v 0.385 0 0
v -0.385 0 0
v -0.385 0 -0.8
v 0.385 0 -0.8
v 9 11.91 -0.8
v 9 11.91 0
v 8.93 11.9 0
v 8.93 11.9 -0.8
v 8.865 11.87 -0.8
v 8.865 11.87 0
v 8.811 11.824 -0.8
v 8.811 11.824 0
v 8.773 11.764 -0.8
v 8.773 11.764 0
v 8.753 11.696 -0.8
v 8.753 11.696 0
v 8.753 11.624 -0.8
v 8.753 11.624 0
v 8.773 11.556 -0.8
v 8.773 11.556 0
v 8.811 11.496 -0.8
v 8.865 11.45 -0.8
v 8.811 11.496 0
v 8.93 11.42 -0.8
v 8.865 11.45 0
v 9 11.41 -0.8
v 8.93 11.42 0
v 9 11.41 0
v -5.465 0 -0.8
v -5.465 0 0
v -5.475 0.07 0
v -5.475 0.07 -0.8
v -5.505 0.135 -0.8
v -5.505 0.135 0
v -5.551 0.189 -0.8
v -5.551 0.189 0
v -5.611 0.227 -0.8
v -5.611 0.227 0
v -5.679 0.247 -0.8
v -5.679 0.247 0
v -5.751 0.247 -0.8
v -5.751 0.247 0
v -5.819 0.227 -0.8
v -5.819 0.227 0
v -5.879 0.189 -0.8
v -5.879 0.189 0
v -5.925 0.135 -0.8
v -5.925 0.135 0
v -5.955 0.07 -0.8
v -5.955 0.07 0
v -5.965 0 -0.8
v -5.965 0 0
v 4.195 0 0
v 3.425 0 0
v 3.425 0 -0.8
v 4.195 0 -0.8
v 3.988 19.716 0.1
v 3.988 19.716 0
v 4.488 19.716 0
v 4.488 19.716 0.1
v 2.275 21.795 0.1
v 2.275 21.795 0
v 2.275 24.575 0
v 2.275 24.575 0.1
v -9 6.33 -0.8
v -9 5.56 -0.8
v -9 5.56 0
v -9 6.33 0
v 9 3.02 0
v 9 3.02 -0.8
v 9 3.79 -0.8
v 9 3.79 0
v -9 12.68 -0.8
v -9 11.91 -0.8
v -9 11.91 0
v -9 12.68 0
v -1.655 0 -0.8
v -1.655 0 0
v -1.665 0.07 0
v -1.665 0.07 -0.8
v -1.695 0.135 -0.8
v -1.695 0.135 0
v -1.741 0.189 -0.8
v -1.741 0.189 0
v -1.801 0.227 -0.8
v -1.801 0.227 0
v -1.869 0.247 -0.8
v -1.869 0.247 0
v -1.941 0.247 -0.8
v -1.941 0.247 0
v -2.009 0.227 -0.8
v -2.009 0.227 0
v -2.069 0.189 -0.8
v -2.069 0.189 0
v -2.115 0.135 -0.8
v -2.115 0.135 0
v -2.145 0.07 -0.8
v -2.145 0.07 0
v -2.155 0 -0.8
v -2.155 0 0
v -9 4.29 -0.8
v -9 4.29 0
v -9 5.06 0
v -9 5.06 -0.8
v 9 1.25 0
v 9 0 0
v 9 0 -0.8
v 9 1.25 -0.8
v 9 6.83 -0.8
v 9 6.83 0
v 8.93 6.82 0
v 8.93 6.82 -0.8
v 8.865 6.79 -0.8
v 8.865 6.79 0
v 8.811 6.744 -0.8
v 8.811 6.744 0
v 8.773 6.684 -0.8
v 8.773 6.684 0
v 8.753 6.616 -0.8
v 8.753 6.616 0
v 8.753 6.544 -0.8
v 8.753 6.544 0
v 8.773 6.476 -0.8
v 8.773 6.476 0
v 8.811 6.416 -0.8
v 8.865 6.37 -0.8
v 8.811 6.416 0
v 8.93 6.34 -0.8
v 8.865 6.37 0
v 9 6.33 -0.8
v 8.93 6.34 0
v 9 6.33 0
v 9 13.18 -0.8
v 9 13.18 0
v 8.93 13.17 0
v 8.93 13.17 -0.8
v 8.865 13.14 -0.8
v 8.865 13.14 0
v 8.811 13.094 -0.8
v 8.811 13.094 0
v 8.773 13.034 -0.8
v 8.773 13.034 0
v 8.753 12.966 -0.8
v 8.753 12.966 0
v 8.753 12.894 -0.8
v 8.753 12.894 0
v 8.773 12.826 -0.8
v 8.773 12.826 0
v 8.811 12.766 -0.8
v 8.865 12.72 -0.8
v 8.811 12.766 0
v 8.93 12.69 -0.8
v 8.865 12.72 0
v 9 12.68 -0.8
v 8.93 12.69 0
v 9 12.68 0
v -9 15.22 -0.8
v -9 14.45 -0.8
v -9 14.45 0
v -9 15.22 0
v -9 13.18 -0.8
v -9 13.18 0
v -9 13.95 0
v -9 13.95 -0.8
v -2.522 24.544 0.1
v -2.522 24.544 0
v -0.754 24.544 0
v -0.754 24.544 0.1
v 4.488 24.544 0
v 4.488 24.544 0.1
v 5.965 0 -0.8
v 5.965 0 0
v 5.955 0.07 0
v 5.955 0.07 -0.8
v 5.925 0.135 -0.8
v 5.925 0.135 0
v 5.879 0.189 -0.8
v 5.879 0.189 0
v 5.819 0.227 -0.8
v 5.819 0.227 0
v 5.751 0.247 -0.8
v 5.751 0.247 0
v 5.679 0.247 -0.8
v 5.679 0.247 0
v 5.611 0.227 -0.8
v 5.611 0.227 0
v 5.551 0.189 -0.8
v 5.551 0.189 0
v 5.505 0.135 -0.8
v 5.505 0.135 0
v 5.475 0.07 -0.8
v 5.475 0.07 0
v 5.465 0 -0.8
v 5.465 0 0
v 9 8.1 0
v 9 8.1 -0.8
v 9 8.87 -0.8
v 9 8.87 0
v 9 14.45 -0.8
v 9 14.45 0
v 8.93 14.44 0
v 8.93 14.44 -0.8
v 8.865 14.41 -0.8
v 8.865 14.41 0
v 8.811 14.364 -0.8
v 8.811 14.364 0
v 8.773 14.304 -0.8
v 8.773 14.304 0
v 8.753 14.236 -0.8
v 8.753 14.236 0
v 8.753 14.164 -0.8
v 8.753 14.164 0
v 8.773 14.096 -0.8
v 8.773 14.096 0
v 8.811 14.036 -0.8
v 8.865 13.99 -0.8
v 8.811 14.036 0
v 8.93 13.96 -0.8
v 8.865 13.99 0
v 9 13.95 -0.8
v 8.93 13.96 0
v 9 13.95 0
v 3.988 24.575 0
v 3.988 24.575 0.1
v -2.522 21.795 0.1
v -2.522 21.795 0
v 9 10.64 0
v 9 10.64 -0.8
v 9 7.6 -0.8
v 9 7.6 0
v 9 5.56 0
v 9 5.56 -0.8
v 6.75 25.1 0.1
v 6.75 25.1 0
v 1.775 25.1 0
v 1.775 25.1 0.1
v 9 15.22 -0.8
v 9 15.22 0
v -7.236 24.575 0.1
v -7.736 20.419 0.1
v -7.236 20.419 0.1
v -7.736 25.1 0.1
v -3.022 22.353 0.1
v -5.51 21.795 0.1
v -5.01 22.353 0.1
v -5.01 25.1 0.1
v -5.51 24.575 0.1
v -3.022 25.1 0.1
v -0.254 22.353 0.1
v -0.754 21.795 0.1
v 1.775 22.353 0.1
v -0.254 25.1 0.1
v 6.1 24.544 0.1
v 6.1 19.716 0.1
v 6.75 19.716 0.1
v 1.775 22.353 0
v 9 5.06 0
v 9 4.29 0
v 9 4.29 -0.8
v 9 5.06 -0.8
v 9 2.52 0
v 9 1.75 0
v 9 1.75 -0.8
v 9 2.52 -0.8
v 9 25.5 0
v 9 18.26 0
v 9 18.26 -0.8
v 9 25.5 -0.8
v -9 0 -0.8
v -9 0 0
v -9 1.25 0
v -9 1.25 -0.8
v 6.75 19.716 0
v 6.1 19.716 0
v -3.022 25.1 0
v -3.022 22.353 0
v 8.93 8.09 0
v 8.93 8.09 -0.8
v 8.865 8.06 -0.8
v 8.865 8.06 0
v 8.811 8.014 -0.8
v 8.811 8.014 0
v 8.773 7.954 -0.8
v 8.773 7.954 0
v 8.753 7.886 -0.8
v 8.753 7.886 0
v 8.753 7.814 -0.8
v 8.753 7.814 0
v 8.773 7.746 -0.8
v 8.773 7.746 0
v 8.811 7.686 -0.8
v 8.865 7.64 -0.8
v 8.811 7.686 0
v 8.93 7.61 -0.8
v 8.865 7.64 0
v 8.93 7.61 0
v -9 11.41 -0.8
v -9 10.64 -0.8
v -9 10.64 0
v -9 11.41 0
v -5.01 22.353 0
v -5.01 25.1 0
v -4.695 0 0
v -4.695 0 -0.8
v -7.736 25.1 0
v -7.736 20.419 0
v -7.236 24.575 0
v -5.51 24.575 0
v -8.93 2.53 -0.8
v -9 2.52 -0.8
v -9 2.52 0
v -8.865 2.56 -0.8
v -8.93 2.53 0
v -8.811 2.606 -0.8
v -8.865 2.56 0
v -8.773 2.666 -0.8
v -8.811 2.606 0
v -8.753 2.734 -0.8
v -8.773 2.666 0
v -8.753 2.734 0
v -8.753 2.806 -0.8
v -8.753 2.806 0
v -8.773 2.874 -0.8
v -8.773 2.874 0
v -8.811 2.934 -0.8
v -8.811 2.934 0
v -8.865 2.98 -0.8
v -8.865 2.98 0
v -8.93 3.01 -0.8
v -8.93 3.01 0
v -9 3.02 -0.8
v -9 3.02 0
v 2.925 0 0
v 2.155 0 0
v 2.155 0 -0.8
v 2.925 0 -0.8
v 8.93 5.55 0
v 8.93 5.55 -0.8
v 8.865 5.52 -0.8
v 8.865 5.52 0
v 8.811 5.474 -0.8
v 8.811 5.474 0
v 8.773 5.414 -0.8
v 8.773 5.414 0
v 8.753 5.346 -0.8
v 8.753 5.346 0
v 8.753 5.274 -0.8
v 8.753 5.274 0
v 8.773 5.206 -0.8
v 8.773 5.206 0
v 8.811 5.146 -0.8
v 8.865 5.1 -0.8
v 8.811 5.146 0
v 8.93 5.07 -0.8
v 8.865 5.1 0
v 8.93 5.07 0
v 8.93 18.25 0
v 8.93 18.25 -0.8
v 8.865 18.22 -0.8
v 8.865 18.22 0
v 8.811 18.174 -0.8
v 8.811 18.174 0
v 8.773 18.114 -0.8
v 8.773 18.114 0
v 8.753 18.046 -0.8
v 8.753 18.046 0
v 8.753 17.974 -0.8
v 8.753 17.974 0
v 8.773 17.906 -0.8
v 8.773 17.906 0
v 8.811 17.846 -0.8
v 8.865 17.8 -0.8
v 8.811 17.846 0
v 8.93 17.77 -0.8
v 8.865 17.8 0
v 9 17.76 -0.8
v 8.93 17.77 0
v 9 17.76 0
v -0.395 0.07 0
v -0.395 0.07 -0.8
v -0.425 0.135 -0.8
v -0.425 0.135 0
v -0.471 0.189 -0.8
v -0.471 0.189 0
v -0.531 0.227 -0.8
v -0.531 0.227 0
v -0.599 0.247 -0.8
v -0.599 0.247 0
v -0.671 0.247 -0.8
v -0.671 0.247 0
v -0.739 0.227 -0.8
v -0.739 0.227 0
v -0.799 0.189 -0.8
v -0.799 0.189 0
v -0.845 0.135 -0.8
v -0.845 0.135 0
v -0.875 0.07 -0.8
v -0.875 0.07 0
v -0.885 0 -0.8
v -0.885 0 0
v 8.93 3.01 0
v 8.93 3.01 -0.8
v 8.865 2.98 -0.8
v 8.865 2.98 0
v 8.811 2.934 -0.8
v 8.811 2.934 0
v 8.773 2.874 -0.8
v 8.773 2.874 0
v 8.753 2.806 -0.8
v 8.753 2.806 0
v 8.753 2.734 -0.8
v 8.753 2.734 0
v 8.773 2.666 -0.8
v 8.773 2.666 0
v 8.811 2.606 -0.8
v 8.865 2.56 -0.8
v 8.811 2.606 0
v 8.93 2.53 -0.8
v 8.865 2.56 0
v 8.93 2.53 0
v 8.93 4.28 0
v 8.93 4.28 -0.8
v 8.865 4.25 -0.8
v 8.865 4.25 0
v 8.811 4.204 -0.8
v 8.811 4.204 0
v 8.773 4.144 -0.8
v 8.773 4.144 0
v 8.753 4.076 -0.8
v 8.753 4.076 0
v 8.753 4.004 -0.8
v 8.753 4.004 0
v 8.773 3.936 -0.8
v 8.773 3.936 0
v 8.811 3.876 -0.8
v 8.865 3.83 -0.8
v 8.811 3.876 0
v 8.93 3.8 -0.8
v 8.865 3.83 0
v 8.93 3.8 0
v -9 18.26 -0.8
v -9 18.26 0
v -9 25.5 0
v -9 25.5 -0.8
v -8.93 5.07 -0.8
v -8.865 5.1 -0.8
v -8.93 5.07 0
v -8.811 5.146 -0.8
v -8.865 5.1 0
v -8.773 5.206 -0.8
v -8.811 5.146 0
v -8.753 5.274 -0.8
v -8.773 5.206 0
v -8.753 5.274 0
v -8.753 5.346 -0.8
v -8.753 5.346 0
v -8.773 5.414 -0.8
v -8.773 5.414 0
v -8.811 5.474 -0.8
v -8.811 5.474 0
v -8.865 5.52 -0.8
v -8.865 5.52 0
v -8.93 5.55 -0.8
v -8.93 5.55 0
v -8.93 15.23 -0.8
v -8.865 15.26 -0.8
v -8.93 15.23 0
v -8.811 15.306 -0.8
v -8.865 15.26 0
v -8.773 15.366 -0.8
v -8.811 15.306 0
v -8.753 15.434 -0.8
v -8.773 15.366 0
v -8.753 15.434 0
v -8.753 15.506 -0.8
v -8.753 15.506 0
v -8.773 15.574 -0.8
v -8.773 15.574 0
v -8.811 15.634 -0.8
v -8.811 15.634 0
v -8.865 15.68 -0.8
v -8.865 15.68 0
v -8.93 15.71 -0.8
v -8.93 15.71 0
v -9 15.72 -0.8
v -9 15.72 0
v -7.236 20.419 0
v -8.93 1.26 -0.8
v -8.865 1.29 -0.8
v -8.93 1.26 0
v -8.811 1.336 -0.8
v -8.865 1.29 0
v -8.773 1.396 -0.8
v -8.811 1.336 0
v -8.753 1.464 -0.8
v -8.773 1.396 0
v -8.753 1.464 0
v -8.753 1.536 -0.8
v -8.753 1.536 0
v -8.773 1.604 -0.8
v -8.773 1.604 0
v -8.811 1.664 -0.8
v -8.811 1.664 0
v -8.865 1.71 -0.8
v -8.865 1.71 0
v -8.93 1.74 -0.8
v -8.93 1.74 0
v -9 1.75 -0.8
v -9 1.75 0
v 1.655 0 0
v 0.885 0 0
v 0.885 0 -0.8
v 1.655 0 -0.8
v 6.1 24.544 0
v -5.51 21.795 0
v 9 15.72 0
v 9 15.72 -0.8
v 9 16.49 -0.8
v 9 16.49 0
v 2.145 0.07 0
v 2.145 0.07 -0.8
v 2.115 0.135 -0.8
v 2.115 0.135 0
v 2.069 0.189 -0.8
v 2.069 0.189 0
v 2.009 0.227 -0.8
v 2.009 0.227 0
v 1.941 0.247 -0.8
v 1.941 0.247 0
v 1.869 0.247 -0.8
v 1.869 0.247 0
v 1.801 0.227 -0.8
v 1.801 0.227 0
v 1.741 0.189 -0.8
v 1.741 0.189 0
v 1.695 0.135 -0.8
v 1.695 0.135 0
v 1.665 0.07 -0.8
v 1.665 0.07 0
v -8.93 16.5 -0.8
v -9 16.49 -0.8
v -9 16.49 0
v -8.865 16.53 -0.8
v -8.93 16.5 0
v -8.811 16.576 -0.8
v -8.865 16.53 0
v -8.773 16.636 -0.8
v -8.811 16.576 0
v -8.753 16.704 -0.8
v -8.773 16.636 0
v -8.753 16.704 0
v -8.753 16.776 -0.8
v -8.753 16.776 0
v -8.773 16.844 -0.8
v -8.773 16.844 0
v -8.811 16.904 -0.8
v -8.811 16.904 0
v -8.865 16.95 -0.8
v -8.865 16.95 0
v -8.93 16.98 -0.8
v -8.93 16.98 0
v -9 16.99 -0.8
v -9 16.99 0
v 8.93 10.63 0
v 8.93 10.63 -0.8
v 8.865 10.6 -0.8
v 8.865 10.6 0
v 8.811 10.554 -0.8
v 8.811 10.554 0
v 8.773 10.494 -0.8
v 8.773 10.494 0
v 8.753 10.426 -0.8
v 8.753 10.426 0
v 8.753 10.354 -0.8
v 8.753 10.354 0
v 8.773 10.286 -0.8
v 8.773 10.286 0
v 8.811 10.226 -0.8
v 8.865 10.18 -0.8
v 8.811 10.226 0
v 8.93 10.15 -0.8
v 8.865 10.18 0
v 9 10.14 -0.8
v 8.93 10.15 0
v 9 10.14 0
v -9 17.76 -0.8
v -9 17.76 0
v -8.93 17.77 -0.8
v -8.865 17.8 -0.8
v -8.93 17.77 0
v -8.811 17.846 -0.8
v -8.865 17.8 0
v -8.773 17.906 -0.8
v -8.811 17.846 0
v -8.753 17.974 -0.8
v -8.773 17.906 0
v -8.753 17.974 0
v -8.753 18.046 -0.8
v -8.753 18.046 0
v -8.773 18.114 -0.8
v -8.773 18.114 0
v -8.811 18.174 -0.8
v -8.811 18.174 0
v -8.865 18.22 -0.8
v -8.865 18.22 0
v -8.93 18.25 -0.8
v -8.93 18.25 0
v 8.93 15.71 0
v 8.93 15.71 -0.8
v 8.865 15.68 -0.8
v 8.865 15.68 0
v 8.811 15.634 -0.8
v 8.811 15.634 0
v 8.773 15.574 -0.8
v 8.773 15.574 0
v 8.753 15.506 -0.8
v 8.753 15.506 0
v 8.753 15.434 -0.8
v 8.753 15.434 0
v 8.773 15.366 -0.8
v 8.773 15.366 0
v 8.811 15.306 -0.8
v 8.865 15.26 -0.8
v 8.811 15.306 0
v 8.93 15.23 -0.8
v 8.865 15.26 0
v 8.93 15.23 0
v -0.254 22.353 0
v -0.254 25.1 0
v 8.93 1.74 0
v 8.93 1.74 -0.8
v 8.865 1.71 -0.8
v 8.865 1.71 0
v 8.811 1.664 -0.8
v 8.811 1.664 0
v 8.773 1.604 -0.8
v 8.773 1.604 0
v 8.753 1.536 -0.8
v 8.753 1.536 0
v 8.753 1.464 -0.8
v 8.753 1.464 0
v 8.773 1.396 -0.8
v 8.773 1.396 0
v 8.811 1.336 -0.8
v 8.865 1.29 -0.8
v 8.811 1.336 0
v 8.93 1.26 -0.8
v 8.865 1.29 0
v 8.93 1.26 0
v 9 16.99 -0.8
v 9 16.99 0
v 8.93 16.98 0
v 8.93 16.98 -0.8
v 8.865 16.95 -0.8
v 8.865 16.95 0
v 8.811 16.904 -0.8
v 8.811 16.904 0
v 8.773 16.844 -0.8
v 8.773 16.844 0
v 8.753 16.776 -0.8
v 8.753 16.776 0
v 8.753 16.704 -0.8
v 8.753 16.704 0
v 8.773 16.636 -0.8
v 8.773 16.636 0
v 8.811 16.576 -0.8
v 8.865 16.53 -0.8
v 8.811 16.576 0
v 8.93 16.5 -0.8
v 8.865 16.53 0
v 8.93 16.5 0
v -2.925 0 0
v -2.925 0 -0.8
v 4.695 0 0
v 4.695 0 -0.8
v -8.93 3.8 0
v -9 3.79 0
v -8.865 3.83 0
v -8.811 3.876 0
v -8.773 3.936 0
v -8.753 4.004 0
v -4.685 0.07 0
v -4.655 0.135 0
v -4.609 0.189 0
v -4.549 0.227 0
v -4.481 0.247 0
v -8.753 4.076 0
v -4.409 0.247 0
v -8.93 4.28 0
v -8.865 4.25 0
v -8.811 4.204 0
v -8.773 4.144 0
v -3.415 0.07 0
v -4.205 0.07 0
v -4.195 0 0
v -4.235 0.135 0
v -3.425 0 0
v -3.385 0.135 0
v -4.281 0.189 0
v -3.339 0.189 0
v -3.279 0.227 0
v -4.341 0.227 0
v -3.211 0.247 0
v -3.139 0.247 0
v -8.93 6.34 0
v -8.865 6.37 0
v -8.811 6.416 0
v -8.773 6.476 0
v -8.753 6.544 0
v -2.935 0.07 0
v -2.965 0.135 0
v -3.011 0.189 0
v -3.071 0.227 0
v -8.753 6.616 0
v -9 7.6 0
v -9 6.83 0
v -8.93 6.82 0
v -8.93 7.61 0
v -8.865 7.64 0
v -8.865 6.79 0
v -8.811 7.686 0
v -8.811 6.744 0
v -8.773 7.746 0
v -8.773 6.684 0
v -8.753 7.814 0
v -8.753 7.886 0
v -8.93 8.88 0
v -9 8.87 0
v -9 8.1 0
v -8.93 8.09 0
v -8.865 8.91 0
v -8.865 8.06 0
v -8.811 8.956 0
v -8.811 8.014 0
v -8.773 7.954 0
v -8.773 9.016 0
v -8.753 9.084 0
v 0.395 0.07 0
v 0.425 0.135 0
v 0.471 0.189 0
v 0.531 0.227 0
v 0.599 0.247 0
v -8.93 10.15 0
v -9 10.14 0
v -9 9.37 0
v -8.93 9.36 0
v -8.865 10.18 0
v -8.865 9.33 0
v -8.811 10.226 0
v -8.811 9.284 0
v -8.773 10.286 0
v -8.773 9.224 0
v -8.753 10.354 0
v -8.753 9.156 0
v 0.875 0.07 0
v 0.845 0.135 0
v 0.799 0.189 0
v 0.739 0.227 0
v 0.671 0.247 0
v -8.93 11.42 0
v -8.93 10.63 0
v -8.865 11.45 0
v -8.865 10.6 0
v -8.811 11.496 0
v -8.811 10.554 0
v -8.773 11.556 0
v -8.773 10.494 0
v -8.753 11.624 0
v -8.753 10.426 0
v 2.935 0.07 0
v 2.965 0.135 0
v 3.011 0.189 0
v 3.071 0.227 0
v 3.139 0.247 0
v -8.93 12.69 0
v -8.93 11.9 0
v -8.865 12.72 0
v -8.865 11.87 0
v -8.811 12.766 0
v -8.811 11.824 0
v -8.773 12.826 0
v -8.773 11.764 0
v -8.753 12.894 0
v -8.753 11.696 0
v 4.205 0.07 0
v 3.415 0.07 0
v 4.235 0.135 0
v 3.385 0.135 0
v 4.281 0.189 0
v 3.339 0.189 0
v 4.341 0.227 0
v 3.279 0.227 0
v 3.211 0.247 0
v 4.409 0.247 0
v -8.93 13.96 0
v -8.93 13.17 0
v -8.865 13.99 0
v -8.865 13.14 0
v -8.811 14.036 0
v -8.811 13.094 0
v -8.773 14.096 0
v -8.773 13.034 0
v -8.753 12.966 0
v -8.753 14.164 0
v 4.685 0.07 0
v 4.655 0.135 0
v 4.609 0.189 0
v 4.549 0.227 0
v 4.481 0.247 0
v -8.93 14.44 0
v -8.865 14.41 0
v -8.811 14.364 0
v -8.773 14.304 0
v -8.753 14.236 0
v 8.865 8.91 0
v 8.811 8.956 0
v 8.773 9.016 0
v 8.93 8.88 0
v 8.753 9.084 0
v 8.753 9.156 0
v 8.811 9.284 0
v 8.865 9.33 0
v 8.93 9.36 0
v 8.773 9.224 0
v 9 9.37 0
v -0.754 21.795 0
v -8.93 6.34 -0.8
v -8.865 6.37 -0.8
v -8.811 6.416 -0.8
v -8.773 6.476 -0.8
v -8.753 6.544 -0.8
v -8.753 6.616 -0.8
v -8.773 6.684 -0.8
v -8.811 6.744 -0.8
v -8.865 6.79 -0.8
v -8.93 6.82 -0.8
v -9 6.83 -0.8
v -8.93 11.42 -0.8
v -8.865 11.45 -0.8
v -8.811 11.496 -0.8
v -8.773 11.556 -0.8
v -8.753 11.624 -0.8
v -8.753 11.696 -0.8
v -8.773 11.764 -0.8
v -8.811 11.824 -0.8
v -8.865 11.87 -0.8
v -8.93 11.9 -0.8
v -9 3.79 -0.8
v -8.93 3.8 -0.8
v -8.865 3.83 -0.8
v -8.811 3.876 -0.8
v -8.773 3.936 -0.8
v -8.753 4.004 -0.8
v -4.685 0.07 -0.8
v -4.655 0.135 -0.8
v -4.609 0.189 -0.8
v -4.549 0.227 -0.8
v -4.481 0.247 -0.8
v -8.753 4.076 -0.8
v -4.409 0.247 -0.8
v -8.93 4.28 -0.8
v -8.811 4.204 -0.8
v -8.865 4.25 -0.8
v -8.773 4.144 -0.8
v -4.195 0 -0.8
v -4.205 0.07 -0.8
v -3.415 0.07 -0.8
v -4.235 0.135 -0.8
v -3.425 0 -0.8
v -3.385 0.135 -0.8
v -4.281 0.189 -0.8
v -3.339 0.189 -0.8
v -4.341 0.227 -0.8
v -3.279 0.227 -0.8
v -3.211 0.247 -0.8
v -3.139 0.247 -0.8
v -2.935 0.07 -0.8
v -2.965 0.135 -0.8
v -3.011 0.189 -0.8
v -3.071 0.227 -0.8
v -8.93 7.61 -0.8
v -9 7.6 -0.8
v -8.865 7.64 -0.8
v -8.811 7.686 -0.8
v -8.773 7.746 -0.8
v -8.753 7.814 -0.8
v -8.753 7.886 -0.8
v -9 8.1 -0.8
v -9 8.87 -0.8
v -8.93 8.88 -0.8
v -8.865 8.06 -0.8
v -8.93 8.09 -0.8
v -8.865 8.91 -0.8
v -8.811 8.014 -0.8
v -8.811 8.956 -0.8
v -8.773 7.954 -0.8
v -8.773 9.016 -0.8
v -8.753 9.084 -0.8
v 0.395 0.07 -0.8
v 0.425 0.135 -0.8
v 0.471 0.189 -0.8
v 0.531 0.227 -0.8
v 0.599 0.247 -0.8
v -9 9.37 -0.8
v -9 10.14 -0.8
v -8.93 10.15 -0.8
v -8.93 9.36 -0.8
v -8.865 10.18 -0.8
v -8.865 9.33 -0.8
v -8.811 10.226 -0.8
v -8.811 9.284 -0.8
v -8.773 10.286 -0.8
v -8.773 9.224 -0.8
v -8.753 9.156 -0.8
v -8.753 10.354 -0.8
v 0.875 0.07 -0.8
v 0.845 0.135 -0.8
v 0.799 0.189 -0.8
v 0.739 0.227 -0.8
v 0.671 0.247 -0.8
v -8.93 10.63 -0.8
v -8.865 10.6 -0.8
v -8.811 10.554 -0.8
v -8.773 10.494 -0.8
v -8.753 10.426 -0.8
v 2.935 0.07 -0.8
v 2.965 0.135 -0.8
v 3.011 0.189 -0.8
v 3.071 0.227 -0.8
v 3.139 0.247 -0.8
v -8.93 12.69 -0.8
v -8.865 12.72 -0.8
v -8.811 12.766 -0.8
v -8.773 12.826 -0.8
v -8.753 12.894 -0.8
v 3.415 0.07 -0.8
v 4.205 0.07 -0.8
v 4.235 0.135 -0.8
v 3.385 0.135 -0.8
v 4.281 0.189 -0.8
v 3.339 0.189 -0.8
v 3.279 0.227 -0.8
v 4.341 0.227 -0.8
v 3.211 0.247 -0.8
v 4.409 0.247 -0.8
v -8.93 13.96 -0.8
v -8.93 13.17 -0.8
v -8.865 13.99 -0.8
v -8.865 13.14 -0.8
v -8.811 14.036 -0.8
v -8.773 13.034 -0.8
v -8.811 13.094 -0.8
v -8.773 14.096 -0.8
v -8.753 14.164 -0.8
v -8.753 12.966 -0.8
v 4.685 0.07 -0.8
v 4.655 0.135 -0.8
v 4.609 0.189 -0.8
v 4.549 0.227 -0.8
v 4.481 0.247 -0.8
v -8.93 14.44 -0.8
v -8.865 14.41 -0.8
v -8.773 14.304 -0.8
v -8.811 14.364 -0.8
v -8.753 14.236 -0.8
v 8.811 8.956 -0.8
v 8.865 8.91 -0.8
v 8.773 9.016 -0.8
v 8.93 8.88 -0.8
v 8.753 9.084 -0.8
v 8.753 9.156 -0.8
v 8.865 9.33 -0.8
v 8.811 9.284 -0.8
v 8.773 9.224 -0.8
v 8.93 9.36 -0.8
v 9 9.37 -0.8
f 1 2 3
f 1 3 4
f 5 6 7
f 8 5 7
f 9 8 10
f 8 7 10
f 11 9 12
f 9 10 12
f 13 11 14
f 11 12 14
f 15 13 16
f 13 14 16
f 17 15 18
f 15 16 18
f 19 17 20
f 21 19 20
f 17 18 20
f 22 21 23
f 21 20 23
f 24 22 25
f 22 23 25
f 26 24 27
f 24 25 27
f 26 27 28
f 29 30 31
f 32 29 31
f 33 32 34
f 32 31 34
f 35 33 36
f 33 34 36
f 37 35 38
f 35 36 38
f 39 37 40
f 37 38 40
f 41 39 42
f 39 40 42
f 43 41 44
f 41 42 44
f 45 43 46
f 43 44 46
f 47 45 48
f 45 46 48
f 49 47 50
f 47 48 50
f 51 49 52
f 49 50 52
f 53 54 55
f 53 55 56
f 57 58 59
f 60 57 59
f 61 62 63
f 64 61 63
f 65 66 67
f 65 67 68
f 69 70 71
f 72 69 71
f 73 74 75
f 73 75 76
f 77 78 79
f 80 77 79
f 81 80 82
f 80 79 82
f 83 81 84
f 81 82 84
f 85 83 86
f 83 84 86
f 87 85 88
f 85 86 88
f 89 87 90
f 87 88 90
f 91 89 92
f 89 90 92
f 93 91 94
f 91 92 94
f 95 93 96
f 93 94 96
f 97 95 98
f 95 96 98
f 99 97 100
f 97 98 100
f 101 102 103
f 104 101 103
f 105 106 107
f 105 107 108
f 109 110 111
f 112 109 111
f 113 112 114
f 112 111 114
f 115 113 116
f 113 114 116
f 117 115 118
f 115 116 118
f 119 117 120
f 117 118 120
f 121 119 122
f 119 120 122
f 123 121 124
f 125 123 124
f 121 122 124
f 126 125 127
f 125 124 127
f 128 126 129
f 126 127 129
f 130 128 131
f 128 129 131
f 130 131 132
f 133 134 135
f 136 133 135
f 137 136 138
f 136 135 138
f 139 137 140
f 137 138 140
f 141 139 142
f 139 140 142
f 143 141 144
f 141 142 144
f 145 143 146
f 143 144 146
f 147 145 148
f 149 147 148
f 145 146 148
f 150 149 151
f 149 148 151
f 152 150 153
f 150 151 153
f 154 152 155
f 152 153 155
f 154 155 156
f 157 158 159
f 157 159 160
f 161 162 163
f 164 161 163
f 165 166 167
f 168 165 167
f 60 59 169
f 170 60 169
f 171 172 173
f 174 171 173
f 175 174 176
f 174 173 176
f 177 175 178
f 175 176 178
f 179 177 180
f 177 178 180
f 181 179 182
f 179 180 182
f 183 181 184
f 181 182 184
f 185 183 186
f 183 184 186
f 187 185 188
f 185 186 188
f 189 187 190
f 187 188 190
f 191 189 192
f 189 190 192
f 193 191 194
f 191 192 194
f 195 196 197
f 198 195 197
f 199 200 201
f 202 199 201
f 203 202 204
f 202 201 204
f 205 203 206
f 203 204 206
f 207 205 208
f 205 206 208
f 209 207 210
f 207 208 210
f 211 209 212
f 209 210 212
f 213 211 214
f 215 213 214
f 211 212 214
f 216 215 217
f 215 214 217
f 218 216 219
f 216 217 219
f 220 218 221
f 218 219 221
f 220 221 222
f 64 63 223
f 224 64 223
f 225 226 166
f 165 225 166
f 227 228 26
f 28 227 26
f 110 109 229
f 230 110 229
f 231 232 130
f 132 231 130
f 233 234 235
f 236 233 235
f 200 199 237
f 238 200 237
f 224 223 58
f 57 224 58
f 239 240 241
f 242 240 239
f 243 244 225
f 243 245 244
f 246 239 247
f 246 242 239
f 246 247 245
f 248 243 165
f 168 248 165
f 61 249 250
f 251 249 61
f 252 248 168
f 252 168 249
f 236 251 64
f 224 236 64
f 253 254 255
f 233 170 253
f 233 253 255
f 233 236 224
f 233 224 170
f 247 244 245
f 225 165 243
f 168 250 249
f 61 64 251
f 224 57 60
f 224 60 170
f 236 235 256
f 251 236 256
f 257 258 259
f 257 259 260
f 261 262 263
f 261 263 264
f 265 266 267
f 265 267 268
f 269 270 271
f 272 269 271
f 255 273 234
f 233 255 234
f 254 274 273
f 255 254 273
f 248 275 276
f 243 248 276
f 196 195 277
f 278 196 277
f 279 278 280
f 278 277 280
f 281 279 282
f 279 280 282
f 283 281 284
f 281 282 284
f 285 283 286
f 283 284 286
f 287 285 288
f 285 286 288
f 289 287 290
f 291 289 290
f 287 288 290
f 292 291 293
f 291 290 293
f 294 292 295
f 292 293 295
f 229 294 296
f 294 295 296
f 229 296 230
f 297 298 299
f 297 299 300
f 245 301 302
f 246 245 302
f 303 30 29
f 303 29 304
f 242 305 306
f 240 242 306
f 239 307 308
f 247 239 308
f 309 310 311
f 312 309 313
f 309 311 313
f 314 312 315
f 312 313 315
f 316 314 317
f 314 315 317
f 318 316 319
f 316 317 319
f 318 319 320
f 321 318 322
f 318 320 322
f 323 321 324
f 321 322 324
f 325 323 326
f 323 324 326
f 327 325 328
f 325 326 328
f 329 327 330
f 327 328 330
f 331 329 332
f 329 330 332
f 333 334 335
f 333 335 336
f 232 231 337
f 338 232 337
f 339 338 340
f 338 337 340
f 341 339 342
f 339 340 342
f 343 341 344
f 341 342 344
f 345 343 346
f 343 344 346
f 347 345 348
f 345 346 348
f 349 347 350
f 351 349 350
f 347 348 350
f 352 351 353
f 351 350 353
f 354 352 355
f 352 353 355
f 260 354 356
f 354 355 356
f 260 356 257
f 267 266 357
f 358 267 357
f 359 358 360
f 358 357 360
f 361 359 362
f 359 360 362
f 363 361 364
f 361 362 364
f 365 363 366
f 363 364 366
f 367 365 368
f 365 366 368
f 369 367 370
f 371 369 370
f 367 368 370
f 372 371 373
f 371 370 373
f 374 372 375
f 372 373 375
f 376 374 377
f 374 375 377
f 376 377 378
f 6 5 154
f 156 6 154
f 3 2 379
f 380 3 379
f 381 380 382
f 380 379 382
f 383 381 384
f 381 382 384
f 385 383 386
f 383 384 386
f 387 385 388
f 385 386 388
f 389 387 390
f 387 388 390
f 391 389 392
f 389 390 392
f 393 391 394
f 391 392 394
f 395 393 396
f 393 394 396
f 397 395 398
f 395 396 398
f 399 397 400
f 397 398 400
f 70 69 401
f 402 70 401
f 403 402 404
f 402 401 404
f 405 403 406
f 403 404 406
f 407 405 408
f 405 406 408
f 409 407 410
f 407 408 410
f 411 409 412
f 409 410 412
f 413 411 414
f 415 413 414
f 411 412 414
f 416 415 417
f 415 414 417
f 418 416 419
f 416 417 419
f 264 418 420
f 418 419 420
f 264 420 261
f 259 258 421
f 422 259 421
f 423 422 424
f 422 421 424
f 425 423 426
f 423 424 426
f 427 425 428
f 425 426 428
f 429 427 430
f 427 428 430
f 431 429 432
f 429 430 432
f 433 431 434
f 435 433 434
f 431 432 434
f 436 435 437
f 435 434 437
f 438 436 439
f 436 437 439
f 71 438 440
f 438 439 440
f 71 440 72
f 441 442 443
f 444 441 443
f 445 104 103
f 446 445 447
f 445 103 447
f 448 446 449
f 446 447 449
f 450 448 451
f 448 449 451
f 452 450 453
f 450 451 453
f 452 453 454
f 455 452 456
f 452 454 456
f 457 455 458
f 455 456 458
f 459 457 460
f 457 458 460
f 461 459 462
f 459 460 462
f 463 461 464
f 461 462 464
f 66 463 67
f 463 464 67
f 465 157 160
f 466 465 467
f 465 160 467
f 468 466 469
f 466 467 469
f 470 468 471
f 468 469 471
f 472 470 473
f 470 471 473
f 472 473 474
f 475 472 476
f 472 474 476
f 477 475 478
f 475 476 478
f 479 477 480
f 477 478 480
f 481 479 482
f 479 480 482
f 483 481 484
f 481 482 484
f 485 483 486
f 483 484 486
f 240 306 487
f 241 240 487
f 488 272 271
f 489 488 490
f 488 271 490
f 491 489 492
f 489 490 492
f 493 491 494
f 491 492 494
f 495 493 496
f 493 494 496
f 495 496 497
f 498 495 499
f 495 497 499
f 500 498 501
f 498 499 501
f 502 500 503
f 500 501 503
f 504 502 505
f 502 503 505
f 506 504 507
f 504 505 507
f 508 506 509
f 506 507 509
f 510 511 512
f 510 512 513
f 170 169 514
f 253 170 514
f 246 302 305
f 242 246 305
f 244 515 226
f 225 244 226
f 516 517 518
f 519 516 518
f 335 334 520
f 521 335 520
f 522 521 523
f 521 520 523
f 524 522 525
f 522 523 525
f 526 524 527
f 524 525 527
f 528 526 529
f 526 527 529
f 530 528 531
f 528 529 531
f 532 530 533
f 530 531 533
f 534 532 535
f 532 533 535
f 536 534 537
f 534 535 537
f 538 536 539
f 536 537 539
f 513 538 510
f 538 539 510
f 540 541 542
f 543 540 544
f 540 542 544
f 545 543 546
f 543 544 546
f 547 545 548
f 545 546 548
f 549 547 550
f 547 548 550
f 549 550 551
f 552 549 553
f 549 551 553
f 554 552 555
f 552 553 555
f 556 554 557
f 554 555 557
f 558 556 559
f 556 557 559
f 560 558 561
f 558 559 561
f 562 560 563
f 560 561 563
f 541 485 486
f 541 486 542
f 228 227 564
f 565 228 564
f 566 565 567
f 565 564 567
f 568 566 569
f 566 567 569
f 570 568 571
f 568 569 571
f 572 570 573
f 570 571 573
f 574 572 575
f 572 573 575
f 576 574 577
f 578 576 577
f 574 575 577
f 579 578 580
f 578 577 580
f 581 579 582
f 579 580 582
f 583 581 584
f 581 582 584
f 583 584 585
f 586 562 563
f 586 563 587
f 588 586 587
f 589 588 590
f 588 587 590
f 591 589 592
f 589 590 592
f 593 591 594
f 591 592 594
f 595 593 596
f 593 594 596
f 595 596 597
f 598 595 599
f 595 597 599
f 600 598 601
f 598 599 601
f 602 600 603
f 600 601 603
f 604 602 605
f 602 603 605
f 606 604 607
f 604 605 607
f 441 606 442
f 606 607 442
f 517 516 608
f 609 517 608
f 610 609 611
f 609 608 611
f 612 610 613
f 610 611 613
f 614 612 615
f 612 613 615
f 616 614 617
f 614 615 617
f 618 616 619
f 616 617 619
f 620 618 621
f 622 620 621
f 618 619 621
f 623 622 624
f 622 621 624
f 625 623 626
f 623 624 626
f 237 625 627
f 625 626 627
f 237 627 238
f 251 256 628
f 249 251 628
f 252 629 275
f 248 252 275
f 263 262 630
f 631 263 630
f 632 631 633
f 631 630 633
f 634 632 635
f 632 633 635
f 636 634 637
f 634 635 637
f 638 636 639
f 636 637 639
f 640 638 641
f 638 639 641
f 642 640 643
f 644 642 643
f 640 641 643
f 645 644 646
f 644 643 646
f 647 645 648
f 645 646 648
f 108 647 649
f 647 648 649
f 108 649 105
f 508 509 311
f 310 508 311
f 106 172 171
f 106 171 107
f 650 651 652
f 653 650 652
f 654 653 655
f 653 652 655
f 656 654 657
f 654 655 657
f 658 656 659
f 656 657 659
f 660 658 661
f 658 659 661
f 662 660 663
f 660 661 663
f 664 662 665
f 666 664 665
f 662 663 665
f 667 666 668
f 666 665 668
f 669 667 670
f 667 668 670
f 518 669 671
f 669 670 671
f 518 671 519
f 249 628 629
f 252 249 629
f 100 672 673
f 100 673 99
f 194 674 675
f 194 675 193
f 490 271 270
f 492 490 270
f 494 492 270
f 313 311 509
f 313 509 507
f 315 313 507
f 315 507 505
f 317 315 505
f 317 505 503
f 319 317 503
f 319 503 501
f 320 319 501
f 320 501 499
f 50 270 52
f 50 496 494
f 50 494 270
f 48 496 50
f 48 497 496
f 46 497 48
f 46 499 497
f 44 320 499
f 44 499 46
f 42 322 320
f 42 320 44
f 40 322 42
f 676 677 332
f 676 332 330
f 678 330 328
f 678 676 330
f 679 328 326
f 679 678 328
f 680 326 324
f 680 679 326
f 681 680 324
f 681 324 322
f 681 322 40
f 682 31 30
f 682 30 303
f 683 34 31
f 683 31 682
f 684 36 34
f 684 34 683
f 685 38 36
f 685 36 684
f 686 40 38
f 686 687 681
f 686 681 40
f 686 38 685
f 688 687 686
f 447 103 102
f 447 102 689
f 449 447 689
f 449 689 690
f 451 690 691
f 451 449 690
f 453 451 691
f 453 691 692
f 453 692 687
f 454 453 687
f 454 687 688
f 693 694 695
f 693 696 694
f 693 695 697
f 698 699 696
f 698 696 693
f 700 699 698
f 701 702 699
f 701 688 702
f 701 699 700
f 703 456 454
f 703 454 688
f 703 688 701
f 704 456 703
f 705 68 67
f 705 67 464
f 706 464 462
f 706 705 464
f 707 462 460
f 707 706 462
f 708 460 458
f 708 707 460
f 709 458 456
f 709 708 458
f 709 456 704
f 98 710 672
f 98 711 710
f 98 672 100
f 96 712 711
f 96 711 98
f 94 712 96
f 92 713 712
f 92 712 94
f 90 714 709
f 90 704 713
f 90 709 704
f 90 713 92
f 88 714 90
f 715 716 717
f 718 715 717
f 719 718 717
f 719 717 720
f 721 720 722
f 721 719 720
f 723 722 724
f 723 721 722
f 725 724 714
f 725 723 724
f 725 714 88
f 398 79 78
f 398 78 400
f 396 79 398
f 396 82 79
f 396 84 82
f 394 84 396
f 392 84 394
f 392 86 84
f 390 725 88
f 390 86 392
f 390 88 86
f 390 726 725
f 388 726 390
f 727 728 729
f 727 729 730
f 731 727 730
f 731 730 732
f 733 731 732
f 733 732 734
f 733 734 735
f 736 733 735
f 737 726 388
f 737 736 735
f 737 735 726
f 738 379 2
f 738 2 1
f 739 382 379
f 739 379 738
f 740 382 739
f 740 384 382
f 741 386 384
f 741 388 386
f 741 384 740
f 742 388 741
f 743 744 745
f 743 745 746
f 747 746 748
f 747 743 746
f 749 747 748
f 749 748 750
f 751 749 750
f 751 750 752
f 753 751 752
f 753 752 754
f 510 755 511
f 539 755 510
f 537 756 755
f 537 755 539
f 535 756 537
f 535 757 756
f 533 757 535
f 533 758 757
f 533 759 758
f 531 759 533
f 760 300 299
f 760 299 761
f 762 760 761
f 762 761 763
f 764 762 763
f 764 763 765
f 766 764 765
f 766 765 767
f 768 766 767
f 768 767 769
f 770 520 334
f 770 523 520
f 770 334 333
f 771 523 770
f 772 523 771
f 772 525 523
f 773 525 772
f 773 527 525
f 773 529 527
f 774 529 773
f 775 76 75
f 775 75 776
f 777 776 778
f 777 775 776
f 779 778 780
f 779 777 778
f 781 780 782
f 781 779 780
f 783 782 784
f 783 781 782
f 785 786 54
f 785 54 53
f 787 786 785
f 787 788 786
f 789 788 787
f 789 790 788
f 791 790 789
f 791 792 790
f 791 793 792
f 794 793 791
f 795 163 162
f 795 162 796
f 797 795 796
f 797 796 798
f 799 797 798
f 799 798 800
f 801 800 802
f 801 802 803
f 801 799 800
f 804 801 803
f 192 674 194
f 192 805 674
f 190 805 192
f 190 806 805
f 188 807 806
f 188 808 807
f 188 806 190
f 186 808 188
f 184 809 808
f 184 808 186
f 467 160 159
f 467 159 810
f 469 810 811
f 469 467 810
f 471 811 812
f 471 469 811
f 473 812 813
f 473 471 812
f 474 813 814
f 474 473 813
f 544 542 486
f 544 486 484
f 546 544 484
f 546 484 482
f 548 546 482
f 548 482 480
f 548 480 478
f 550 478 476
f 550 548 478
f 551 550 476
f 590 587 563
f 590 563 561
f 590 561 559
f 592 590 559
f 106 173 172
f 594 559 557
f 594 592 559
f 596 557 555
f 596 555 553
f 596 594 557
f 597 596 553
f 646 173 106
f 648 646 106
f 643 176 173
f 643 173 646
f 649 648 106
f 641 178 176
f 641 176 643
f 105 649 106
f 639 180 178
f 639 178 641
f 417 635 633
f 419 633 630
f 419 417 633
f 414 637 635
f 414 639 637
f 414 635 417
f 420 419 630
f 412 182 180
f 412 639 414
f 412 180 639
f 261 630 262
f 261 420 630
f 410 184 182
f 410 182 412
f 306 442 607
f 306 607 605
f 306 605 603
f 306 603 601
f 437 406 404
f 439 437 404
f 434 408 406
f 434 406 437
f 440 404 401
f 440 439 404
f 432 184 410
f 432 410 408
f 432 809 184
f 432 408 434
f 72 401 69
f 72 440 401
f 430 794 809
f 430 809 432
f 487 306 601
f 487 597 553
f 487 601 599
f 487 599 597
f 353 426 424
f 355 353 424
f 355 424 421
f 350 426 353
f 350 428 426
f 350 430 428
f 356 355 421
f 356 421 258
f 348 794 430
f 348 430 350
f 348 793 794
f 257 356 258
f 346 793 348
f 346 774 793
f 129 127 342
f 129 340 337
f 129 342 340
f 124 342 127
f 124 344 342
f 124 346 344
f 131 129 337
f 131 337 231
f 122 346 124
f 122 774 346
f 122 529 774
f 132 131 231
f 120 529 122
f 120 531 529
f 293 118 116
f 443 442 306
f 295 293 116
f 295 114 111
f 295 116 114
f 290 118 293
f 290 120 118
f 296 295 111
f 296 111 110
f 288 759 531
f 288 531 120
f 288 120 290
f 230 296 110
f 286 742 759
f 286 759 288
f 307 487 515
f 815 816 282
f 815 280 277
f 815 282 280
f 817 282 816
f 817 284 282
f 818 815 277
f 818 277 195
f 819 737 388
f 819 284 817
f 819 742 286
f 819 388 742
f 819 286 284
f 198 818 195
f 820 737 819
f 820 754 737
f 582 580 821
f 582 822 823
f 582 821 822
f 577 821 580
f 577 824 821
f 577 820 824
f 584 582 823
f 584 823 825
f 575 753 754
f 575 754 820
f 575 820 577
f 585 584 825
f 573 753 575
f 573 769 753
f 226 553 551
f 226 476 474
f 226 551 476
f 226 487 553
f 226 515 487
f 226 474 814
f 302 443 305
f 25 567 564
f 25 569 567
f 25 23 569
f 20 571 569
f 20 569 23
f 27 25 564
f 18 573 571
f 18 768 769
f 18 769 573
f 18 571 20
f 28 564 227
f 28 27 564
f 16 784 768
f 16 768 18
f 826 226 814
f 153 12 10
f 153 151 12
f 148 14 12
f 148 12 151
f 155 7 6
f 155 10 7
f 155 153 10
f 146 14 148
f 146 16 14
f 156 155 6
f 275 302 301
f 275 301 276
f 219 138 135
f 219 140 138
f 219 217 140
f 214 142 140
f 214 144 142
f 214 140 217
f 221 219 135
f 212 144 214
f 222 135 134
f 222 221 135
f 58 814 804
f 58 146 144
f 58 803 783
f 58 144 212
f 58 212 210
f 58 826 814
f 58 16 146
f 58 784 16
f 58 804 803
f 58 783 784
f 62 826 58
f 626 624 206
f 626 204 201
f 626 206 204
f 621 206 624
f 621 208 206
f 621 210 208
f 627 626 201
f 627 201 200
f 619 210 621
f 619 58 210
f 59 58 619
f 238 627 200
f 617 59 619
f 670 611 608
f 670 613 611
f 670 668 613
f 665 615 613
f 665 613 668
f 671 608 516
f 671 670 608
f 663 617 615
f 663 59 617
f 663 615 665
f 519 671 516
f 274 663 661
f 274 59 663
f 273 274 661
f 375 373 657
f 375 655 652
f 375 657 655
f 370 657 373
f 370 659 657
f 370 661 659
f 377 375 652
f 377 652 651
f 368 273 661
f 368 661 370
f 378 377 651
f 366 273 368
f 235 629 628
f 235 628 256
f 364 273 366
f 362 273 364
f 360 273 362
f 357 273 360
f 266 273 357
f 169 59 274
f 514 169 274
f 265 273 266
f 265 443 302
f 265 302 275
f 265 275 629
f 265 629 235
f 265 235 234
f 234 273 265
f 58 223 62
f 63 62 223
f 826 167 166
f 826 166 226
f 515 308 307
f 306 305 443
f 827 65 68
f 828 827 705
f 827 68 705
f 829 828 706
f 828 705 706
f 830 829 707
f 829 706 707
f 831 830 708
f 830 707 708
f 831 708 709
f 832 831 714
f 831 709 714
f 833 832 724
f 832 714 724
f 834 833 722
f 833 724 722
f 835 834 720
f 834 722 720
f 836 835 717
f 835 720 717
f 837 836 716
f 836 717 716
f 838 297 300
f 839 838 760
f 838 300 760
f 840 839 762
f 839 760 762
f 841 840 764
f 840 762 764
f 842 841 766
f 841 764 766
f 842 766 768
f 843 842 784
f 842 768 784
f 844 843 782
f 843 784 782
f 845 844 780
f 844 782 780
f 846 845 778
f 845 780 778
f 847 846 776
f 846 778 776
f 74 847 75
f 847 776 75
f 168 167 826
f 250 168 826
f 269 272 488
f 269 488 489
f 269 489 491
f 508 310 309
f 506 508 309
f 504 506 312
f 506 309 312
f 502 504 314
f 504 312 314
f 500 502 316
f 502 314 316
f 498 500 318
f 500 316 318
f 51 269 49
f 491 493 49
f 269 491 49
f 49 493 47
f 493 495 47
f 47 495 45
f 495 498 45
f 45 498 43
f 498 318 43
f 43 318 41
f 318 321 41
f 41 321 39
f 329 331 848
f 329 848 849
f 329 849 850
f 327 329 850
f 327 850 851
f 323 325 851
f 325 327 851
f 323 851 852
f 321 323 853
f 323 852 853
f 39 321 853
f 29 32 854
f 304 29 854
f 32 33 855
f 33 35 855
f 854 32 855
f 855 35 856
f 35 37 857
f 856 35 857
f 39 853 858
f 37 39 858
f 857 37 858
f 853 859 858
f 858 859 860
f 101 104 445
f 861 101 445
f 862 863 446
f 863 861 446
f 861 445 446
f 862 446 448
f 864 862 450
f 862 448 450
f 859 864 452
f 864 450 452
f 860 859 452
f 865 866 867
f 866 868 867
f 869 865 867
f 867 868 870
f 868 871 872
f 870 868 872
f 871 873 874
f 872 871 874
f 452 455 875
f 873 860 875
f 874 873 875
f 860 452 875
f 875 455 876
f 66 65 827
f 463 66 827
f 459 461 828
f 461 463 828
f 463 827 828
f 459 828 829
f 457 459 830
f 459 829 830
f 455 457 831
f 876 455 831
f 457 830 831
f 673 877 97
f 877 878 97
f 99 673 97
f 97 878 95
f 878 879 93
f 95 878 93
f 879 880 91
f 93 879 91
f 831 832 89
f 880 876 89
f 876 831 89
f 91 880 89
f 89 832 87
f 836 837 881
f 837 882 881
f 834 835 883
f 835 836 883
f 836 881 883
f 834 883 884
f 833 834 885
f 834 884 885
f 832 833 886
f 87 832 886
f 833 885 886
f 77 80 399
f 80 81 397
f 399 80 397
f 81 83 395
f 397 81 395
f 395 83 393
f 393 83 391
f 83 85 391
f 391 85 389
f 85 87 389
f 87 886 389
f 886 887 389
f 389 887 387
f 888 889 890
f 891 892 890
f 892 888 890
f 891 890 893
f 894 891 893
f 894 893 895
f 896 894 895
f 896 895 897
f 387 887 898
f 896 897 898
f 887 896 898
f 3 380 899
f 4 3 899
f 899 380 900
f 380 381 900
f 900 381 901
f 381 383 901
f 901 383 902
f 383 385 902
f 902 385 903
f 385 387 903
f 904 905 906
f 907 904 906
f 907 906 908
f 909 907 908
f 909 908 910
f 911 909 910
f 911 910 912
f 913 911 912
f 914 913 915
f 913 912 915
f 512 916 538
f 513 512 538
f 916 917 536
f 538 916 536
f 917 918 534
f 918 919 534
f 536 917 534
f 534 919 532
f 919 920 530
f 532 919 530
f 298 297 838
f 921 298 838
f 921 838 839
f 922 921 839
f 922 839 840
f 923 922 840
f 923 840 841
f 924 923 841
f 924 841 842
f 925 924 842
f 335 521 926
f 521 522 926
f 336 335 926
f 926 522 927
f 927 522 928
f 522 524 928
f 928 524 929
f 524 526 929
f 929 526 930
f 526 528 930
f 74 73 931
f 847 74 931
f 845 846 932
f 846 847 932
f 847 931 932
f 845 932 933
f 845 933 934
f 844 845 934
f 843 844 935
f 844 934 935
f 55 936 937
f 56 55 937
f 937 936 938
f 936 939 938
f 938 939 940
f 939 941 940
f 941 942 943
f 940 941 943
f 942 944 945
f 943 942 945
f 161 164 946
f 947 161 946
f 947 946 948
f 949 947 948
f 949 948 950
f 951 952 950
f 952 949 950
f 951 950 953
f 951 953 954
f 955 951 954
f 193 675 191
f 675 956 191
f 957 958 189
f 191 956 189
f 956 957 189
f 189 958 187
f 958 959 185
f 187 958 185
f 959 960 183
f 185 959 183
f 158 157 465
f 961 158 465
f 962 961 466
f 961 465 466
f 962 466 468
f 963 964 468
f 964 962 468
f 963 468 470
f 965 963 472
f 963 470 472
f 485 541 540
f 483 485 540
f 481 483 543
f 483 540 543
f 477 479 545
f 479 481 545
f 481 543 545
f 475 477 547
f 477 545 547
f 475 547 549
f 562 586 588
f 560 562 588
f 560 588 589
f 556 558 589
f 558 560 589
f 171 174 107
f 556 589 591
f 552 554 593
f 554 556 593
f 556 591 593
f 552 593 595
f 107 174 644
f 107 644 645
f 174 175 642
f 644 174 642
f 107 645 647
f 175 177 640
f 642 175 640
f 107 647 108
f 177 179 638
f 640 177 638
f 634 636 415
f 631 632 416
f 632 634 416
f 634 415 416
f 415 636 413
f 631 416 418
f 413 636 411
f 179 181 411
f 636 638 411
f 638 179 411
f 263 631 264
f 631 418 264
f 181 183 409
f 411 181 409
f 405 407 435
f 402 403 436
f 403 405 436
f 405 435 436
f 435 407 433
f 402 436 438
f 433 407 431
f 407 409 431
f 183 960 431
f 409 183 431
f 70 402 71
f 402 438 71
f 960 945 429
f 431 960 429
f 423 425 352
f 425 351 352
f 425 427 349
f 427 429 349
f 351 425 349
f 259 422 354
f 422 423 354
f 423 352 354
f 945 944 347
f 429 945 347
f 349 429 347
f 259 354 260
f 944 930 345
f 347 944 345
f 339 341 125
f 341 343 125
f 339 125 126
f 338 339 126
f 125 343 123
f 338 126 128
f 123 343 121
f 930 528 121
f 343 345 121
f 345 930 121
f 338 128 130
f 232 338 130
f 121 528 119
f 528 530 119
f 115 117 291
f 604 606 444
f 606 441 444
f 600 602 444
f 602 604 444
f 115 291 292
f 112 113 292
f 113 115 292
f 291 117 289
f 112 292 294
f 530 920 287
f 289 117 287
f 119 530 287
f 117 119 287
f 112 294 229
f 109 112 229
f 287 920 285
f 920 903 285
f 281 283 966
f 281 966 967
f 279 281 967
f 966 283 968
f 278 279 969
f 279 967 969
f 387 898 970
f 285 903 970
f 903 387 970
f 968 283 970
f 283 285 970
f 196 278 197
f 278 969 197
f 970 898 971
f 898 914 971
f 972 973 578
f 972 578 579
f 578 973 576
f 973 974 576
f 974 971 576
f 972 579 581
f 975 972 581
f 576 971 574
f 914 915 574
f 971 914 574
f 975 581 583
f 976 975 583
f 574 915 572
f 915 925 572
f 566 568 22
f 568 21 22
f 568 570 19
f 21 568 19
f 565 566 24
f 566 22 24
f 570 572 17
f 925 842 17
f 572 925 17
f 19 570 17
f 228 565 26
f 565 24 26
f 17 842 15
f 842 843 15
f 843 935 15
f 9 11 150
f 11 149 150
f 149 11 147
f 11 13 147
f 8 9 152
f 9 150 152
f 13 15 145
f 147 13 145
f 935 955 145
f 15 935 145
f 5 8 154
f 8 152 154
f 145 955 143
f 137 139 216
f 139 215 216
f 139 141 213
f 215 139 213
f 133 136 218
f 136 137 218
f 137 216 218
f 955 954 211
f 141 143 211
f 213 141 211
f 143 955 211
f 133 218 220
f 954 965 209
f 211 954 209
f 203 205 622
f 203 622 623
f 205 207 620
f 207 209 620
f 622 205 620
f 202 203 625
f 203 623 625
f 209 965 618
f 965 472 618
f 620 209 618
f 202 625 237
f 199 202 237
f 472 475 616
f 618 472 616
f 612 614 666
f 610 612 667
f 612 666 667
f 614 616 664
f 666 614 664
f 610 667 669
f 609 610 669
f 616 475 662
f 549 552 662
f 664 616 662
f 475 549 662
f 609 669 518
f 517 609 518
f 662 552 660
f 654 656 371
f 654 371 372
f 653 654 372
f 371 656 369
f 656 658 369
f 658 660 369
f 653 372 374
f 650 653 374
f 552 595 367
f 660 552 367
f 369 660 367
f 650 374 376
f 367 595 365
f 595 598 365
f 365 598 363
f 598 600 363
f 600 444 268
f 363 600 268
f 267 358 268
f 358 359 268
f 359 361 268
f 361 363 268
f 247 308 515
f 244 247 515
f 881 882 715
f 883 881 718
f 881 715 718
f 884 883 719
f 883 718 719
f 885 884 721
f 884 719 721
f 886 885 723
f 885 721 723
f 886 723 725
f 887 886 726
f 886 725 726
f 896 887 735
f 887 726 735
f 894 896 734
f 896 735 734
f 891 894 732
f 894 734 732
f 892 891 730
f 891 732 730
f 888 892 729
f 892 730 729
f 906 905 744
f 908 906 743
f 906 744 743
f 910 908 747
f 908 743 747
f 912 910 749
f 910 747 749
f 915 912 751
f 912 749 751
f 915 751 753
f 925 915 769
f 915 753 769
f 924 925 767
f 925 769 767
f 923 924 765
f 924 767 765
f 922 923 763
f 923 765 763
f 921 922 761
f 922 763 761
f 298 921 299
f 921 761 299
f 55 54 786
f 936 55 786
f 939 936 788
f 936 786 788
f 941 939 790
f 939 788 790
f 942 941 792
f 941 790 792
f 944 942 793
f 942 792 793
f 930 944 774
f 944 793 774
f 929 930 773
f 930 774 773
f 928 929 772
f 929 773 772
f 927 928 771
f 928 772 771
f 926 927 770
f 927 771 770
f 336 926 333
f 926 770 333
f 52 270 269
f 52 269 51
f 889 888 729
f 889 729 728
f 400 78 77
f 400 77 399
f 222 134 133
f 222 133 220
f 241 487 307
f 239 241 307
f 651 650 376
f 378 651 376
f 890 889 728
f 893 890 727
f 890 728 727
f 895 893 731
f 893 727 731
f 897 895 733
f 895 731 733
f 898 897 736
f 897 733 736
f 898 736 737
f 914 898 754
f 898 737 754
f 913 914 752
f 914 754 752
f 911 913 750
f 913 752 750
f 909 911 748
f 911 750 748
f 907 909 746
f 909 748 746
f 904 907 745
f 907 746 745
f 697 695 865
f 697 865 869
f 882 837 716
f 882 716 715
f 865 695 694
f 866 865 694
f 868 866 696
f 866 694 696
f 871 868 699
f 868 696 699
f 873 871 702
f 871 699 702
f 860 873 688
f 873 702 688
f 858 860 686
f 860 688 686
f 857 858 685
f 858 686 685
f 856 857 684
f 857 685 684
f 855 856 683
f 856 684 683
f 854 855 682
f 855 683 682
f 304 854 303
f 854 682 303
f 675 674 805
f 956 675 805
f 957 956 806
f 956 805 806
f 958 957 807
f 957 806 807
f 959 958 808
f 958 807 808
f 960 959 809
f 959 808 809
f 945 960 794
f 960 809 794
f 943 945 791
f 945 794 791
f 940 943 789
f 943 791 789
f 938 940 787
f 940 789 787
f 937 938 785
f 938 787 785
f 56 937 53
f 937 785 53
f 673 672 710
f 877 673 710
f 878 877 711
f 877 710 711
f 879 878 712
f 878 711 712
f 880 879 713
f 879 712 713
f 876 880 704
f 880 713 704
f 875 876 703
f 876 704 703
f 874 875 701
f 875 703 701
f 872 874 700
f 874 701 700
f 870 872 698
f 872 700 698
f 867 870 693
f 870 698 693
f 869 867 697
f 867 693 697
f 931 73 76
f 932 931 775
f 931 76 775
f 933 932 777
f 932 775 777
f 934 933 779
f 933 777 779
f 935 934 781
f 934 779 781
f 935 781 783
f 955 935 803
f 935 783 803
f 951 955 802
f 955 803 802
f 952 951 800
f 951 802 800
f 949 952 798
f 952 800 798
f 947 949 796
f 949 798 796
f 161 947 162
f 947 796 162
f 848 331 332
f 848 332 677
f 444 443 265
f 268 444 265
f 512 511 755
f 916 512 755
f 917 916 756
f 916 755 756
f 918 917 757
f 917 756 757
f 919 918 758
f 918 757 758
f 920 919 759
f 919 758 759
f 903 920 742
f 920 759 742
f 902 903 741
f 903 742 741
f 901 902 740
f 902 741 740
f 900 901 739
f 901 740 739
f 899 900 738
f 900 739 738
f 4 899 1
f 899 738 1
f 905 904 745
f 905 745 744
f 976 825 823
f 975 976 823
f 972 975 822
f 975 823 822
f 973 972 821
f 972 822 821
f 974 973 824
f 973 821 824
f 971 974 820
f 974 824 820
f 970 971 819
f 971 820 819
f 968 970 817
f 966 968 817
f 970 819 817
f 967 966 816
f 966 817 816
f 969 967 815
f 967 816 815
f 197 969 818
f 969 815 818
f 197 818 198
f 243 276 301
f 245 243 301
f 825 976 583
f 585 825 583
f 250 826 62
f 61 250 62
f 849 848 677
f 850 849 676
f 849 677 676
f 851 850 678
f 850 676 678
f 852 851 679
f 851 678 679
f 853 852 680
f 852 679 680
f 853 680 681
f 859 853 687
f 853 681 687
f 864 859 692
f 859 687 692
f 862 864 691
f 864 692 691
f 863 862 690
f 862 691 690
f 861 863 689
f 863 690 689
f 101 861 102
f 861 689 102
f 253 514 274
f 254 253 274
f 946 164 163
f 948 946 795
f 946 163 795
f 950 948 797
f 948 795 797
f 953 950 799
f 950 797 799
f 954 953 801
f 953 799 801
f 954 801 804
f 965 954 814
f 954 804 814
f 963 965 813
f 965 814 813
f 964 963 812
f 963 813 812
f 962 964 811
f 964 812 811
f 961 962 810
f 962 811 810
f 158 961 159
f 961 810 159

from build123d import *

# Parameters (mm, degrees)
SKETCH_W     = 18
SKETCH_H     = 25.5
PAD_DEPTH    = 0.8
SKETCH001_R  = 0.25
POCKET_DEPTH = 5
PAD001_DEPTH = 0.1


with BuildPart() as part:
    # Sketch → Pad (new body)
    with BuildSketch(Plane.XY):
        with Locations((0, 12.75)):
            Rectangle(SKETCH_W, SKETCH_H)
    extrude(amount=-PAD_DEPTH)

    # Sketch001 → Pocket (cut)
    with BuildSketch(Plane.XY):
        with Locations((-5.715, 0)):
            Circle(SKETCH001_R)
        with Locations((-4.445, 0)):
            Circle(SKETCH001_R)
        with Locations((-3.175, 0)):
            Circle(SKETCH001_R)
        with Locations((-1.905, 0)):
            Circle(SKETCH001_R)
        with Locations((-0.635, 0)):
            Circle(SKETCH001_R)
        with Locations((0.635, 0)):
            Circle(SKETCH001_R)
        with Locations((1.905, 0)):
            Circle(SKETCH001_R)
        with Locations((3.175, 0)):
            Circle(SKETCH001_R)
        with Locations((4.445, 0)):
            Circle(SKETCH001_R)
        with Locations((5.715, 0)):
            Circle(SKETCH001_R)
        with Locations((-9, 1.5)):
            Circle(SKETCH001_R)
        with Locations((-9, 2.77)):
            Circle(SKETCH001_R)
        with Locations((-9, 4.04)):
            Circle(SKETCH001_R)
        with Locations((-9, 5.31)):
            Circle(SKETCH001_R)
        with Locations((-9, 6.58)):
            Circle(SKETCH001_R)
        with Locations((-9, 7.85)):
            Circle(SKETCH001_R)
        with Locations((-9, 9.12)):
            Circle(SKETCH001_R)
        with Locations((-9, 10.39)):
            Circle(SKETCH001_R)
        with Locations((-9, 11.66)):
            Circle(SKETCH001_R)
        with Locations((-9, 12.93)):
            Circle(SKETCH001_R)
        with Locations((-9, 14.2)):
            Circle(SKETCH001_R)
        with Locations((-9, 15.47)):
            Circle(SKETCH001_R)
        with Locations((-9, 16.74)):
            Circle(SKETCH001_R)
        with Locations((-9, 18.01)):
            Circle(SKETCH001_R)
        with Locations((9, 1.5)):
            Circle(SKETCH001_R)
        with Locations((9, 2.77)):
            Circle(SKETCH001_R)
        with Locations((9, 4.04)):
            Circle(SKETCH001_R)
        with Locations((9, 5.31)):
            Circle(SKETCH001_R)
        with Locations((9, 6.58)):
            Circle(SKETCH001_R)
        with Locations((9, 7.85)):
            Circle(SKETCH001_R)
        with Locations((9, 9.12)):
            Circle(SKETCH001_R)
        with Locations((9, 10.39)):
            Circle(SKETCH001_R)
        with Locations((9, 11.66)):
            Circle(SKETCH001_R)
        with Locations((9, 12.93)):
            Circle(SKETCH001_R)
        with Locations((9, 14.2)):
            Circle(SKETCH001_R)
        with Locations((9, 15.47)):
            Circle(SKETCH001_R)
        with Locations((9, 16.74)):
            Circle(SKETCH001_R)
        with Locations((9, 18.01)):
            Circle(SKETCH001_R)
    extrude(amount=-POCKET_DEPTH, mode=Mode.SUBTRACT)

    # Sketch002 → Pad001 (join)
    with BuildSketch(Plane.XY):
        Polygon((6.750327, 19.716486), (6.750327, 25.1), (1.77515, 25.1), (1.77515, 22.352757), (-0.253976, 22.352757), (-0.253976, 25.1), (-3.021827, 25.1), (-3.021827, 22.352757), (-5.009602, 22.352757), (-5.009602, 25.1), (-7.736101, 25.1), (-7.736101, 20.419491), (-7.236101, 20.419491), (-7.236101, 24.575495), (-5.509602, 24.575495), (-5.509602, 21.794554), (-2.521827, 21.794554), (-2.521827, 24.544479), (-0.753976, 24.544479), (-0.753976, 21.794554), (2.27515, 21.794554), (2.27515, 24.575495), (3.98755, 24.575495), (3.98755, 19.716486), (4.48755, 19.716486), (4.48755, 24.544479), (6.100327, 24.544479), (6.100327, 19.716486), align=None)
    extrude(amount=PAD001_DEPTH)


solid = part.part
